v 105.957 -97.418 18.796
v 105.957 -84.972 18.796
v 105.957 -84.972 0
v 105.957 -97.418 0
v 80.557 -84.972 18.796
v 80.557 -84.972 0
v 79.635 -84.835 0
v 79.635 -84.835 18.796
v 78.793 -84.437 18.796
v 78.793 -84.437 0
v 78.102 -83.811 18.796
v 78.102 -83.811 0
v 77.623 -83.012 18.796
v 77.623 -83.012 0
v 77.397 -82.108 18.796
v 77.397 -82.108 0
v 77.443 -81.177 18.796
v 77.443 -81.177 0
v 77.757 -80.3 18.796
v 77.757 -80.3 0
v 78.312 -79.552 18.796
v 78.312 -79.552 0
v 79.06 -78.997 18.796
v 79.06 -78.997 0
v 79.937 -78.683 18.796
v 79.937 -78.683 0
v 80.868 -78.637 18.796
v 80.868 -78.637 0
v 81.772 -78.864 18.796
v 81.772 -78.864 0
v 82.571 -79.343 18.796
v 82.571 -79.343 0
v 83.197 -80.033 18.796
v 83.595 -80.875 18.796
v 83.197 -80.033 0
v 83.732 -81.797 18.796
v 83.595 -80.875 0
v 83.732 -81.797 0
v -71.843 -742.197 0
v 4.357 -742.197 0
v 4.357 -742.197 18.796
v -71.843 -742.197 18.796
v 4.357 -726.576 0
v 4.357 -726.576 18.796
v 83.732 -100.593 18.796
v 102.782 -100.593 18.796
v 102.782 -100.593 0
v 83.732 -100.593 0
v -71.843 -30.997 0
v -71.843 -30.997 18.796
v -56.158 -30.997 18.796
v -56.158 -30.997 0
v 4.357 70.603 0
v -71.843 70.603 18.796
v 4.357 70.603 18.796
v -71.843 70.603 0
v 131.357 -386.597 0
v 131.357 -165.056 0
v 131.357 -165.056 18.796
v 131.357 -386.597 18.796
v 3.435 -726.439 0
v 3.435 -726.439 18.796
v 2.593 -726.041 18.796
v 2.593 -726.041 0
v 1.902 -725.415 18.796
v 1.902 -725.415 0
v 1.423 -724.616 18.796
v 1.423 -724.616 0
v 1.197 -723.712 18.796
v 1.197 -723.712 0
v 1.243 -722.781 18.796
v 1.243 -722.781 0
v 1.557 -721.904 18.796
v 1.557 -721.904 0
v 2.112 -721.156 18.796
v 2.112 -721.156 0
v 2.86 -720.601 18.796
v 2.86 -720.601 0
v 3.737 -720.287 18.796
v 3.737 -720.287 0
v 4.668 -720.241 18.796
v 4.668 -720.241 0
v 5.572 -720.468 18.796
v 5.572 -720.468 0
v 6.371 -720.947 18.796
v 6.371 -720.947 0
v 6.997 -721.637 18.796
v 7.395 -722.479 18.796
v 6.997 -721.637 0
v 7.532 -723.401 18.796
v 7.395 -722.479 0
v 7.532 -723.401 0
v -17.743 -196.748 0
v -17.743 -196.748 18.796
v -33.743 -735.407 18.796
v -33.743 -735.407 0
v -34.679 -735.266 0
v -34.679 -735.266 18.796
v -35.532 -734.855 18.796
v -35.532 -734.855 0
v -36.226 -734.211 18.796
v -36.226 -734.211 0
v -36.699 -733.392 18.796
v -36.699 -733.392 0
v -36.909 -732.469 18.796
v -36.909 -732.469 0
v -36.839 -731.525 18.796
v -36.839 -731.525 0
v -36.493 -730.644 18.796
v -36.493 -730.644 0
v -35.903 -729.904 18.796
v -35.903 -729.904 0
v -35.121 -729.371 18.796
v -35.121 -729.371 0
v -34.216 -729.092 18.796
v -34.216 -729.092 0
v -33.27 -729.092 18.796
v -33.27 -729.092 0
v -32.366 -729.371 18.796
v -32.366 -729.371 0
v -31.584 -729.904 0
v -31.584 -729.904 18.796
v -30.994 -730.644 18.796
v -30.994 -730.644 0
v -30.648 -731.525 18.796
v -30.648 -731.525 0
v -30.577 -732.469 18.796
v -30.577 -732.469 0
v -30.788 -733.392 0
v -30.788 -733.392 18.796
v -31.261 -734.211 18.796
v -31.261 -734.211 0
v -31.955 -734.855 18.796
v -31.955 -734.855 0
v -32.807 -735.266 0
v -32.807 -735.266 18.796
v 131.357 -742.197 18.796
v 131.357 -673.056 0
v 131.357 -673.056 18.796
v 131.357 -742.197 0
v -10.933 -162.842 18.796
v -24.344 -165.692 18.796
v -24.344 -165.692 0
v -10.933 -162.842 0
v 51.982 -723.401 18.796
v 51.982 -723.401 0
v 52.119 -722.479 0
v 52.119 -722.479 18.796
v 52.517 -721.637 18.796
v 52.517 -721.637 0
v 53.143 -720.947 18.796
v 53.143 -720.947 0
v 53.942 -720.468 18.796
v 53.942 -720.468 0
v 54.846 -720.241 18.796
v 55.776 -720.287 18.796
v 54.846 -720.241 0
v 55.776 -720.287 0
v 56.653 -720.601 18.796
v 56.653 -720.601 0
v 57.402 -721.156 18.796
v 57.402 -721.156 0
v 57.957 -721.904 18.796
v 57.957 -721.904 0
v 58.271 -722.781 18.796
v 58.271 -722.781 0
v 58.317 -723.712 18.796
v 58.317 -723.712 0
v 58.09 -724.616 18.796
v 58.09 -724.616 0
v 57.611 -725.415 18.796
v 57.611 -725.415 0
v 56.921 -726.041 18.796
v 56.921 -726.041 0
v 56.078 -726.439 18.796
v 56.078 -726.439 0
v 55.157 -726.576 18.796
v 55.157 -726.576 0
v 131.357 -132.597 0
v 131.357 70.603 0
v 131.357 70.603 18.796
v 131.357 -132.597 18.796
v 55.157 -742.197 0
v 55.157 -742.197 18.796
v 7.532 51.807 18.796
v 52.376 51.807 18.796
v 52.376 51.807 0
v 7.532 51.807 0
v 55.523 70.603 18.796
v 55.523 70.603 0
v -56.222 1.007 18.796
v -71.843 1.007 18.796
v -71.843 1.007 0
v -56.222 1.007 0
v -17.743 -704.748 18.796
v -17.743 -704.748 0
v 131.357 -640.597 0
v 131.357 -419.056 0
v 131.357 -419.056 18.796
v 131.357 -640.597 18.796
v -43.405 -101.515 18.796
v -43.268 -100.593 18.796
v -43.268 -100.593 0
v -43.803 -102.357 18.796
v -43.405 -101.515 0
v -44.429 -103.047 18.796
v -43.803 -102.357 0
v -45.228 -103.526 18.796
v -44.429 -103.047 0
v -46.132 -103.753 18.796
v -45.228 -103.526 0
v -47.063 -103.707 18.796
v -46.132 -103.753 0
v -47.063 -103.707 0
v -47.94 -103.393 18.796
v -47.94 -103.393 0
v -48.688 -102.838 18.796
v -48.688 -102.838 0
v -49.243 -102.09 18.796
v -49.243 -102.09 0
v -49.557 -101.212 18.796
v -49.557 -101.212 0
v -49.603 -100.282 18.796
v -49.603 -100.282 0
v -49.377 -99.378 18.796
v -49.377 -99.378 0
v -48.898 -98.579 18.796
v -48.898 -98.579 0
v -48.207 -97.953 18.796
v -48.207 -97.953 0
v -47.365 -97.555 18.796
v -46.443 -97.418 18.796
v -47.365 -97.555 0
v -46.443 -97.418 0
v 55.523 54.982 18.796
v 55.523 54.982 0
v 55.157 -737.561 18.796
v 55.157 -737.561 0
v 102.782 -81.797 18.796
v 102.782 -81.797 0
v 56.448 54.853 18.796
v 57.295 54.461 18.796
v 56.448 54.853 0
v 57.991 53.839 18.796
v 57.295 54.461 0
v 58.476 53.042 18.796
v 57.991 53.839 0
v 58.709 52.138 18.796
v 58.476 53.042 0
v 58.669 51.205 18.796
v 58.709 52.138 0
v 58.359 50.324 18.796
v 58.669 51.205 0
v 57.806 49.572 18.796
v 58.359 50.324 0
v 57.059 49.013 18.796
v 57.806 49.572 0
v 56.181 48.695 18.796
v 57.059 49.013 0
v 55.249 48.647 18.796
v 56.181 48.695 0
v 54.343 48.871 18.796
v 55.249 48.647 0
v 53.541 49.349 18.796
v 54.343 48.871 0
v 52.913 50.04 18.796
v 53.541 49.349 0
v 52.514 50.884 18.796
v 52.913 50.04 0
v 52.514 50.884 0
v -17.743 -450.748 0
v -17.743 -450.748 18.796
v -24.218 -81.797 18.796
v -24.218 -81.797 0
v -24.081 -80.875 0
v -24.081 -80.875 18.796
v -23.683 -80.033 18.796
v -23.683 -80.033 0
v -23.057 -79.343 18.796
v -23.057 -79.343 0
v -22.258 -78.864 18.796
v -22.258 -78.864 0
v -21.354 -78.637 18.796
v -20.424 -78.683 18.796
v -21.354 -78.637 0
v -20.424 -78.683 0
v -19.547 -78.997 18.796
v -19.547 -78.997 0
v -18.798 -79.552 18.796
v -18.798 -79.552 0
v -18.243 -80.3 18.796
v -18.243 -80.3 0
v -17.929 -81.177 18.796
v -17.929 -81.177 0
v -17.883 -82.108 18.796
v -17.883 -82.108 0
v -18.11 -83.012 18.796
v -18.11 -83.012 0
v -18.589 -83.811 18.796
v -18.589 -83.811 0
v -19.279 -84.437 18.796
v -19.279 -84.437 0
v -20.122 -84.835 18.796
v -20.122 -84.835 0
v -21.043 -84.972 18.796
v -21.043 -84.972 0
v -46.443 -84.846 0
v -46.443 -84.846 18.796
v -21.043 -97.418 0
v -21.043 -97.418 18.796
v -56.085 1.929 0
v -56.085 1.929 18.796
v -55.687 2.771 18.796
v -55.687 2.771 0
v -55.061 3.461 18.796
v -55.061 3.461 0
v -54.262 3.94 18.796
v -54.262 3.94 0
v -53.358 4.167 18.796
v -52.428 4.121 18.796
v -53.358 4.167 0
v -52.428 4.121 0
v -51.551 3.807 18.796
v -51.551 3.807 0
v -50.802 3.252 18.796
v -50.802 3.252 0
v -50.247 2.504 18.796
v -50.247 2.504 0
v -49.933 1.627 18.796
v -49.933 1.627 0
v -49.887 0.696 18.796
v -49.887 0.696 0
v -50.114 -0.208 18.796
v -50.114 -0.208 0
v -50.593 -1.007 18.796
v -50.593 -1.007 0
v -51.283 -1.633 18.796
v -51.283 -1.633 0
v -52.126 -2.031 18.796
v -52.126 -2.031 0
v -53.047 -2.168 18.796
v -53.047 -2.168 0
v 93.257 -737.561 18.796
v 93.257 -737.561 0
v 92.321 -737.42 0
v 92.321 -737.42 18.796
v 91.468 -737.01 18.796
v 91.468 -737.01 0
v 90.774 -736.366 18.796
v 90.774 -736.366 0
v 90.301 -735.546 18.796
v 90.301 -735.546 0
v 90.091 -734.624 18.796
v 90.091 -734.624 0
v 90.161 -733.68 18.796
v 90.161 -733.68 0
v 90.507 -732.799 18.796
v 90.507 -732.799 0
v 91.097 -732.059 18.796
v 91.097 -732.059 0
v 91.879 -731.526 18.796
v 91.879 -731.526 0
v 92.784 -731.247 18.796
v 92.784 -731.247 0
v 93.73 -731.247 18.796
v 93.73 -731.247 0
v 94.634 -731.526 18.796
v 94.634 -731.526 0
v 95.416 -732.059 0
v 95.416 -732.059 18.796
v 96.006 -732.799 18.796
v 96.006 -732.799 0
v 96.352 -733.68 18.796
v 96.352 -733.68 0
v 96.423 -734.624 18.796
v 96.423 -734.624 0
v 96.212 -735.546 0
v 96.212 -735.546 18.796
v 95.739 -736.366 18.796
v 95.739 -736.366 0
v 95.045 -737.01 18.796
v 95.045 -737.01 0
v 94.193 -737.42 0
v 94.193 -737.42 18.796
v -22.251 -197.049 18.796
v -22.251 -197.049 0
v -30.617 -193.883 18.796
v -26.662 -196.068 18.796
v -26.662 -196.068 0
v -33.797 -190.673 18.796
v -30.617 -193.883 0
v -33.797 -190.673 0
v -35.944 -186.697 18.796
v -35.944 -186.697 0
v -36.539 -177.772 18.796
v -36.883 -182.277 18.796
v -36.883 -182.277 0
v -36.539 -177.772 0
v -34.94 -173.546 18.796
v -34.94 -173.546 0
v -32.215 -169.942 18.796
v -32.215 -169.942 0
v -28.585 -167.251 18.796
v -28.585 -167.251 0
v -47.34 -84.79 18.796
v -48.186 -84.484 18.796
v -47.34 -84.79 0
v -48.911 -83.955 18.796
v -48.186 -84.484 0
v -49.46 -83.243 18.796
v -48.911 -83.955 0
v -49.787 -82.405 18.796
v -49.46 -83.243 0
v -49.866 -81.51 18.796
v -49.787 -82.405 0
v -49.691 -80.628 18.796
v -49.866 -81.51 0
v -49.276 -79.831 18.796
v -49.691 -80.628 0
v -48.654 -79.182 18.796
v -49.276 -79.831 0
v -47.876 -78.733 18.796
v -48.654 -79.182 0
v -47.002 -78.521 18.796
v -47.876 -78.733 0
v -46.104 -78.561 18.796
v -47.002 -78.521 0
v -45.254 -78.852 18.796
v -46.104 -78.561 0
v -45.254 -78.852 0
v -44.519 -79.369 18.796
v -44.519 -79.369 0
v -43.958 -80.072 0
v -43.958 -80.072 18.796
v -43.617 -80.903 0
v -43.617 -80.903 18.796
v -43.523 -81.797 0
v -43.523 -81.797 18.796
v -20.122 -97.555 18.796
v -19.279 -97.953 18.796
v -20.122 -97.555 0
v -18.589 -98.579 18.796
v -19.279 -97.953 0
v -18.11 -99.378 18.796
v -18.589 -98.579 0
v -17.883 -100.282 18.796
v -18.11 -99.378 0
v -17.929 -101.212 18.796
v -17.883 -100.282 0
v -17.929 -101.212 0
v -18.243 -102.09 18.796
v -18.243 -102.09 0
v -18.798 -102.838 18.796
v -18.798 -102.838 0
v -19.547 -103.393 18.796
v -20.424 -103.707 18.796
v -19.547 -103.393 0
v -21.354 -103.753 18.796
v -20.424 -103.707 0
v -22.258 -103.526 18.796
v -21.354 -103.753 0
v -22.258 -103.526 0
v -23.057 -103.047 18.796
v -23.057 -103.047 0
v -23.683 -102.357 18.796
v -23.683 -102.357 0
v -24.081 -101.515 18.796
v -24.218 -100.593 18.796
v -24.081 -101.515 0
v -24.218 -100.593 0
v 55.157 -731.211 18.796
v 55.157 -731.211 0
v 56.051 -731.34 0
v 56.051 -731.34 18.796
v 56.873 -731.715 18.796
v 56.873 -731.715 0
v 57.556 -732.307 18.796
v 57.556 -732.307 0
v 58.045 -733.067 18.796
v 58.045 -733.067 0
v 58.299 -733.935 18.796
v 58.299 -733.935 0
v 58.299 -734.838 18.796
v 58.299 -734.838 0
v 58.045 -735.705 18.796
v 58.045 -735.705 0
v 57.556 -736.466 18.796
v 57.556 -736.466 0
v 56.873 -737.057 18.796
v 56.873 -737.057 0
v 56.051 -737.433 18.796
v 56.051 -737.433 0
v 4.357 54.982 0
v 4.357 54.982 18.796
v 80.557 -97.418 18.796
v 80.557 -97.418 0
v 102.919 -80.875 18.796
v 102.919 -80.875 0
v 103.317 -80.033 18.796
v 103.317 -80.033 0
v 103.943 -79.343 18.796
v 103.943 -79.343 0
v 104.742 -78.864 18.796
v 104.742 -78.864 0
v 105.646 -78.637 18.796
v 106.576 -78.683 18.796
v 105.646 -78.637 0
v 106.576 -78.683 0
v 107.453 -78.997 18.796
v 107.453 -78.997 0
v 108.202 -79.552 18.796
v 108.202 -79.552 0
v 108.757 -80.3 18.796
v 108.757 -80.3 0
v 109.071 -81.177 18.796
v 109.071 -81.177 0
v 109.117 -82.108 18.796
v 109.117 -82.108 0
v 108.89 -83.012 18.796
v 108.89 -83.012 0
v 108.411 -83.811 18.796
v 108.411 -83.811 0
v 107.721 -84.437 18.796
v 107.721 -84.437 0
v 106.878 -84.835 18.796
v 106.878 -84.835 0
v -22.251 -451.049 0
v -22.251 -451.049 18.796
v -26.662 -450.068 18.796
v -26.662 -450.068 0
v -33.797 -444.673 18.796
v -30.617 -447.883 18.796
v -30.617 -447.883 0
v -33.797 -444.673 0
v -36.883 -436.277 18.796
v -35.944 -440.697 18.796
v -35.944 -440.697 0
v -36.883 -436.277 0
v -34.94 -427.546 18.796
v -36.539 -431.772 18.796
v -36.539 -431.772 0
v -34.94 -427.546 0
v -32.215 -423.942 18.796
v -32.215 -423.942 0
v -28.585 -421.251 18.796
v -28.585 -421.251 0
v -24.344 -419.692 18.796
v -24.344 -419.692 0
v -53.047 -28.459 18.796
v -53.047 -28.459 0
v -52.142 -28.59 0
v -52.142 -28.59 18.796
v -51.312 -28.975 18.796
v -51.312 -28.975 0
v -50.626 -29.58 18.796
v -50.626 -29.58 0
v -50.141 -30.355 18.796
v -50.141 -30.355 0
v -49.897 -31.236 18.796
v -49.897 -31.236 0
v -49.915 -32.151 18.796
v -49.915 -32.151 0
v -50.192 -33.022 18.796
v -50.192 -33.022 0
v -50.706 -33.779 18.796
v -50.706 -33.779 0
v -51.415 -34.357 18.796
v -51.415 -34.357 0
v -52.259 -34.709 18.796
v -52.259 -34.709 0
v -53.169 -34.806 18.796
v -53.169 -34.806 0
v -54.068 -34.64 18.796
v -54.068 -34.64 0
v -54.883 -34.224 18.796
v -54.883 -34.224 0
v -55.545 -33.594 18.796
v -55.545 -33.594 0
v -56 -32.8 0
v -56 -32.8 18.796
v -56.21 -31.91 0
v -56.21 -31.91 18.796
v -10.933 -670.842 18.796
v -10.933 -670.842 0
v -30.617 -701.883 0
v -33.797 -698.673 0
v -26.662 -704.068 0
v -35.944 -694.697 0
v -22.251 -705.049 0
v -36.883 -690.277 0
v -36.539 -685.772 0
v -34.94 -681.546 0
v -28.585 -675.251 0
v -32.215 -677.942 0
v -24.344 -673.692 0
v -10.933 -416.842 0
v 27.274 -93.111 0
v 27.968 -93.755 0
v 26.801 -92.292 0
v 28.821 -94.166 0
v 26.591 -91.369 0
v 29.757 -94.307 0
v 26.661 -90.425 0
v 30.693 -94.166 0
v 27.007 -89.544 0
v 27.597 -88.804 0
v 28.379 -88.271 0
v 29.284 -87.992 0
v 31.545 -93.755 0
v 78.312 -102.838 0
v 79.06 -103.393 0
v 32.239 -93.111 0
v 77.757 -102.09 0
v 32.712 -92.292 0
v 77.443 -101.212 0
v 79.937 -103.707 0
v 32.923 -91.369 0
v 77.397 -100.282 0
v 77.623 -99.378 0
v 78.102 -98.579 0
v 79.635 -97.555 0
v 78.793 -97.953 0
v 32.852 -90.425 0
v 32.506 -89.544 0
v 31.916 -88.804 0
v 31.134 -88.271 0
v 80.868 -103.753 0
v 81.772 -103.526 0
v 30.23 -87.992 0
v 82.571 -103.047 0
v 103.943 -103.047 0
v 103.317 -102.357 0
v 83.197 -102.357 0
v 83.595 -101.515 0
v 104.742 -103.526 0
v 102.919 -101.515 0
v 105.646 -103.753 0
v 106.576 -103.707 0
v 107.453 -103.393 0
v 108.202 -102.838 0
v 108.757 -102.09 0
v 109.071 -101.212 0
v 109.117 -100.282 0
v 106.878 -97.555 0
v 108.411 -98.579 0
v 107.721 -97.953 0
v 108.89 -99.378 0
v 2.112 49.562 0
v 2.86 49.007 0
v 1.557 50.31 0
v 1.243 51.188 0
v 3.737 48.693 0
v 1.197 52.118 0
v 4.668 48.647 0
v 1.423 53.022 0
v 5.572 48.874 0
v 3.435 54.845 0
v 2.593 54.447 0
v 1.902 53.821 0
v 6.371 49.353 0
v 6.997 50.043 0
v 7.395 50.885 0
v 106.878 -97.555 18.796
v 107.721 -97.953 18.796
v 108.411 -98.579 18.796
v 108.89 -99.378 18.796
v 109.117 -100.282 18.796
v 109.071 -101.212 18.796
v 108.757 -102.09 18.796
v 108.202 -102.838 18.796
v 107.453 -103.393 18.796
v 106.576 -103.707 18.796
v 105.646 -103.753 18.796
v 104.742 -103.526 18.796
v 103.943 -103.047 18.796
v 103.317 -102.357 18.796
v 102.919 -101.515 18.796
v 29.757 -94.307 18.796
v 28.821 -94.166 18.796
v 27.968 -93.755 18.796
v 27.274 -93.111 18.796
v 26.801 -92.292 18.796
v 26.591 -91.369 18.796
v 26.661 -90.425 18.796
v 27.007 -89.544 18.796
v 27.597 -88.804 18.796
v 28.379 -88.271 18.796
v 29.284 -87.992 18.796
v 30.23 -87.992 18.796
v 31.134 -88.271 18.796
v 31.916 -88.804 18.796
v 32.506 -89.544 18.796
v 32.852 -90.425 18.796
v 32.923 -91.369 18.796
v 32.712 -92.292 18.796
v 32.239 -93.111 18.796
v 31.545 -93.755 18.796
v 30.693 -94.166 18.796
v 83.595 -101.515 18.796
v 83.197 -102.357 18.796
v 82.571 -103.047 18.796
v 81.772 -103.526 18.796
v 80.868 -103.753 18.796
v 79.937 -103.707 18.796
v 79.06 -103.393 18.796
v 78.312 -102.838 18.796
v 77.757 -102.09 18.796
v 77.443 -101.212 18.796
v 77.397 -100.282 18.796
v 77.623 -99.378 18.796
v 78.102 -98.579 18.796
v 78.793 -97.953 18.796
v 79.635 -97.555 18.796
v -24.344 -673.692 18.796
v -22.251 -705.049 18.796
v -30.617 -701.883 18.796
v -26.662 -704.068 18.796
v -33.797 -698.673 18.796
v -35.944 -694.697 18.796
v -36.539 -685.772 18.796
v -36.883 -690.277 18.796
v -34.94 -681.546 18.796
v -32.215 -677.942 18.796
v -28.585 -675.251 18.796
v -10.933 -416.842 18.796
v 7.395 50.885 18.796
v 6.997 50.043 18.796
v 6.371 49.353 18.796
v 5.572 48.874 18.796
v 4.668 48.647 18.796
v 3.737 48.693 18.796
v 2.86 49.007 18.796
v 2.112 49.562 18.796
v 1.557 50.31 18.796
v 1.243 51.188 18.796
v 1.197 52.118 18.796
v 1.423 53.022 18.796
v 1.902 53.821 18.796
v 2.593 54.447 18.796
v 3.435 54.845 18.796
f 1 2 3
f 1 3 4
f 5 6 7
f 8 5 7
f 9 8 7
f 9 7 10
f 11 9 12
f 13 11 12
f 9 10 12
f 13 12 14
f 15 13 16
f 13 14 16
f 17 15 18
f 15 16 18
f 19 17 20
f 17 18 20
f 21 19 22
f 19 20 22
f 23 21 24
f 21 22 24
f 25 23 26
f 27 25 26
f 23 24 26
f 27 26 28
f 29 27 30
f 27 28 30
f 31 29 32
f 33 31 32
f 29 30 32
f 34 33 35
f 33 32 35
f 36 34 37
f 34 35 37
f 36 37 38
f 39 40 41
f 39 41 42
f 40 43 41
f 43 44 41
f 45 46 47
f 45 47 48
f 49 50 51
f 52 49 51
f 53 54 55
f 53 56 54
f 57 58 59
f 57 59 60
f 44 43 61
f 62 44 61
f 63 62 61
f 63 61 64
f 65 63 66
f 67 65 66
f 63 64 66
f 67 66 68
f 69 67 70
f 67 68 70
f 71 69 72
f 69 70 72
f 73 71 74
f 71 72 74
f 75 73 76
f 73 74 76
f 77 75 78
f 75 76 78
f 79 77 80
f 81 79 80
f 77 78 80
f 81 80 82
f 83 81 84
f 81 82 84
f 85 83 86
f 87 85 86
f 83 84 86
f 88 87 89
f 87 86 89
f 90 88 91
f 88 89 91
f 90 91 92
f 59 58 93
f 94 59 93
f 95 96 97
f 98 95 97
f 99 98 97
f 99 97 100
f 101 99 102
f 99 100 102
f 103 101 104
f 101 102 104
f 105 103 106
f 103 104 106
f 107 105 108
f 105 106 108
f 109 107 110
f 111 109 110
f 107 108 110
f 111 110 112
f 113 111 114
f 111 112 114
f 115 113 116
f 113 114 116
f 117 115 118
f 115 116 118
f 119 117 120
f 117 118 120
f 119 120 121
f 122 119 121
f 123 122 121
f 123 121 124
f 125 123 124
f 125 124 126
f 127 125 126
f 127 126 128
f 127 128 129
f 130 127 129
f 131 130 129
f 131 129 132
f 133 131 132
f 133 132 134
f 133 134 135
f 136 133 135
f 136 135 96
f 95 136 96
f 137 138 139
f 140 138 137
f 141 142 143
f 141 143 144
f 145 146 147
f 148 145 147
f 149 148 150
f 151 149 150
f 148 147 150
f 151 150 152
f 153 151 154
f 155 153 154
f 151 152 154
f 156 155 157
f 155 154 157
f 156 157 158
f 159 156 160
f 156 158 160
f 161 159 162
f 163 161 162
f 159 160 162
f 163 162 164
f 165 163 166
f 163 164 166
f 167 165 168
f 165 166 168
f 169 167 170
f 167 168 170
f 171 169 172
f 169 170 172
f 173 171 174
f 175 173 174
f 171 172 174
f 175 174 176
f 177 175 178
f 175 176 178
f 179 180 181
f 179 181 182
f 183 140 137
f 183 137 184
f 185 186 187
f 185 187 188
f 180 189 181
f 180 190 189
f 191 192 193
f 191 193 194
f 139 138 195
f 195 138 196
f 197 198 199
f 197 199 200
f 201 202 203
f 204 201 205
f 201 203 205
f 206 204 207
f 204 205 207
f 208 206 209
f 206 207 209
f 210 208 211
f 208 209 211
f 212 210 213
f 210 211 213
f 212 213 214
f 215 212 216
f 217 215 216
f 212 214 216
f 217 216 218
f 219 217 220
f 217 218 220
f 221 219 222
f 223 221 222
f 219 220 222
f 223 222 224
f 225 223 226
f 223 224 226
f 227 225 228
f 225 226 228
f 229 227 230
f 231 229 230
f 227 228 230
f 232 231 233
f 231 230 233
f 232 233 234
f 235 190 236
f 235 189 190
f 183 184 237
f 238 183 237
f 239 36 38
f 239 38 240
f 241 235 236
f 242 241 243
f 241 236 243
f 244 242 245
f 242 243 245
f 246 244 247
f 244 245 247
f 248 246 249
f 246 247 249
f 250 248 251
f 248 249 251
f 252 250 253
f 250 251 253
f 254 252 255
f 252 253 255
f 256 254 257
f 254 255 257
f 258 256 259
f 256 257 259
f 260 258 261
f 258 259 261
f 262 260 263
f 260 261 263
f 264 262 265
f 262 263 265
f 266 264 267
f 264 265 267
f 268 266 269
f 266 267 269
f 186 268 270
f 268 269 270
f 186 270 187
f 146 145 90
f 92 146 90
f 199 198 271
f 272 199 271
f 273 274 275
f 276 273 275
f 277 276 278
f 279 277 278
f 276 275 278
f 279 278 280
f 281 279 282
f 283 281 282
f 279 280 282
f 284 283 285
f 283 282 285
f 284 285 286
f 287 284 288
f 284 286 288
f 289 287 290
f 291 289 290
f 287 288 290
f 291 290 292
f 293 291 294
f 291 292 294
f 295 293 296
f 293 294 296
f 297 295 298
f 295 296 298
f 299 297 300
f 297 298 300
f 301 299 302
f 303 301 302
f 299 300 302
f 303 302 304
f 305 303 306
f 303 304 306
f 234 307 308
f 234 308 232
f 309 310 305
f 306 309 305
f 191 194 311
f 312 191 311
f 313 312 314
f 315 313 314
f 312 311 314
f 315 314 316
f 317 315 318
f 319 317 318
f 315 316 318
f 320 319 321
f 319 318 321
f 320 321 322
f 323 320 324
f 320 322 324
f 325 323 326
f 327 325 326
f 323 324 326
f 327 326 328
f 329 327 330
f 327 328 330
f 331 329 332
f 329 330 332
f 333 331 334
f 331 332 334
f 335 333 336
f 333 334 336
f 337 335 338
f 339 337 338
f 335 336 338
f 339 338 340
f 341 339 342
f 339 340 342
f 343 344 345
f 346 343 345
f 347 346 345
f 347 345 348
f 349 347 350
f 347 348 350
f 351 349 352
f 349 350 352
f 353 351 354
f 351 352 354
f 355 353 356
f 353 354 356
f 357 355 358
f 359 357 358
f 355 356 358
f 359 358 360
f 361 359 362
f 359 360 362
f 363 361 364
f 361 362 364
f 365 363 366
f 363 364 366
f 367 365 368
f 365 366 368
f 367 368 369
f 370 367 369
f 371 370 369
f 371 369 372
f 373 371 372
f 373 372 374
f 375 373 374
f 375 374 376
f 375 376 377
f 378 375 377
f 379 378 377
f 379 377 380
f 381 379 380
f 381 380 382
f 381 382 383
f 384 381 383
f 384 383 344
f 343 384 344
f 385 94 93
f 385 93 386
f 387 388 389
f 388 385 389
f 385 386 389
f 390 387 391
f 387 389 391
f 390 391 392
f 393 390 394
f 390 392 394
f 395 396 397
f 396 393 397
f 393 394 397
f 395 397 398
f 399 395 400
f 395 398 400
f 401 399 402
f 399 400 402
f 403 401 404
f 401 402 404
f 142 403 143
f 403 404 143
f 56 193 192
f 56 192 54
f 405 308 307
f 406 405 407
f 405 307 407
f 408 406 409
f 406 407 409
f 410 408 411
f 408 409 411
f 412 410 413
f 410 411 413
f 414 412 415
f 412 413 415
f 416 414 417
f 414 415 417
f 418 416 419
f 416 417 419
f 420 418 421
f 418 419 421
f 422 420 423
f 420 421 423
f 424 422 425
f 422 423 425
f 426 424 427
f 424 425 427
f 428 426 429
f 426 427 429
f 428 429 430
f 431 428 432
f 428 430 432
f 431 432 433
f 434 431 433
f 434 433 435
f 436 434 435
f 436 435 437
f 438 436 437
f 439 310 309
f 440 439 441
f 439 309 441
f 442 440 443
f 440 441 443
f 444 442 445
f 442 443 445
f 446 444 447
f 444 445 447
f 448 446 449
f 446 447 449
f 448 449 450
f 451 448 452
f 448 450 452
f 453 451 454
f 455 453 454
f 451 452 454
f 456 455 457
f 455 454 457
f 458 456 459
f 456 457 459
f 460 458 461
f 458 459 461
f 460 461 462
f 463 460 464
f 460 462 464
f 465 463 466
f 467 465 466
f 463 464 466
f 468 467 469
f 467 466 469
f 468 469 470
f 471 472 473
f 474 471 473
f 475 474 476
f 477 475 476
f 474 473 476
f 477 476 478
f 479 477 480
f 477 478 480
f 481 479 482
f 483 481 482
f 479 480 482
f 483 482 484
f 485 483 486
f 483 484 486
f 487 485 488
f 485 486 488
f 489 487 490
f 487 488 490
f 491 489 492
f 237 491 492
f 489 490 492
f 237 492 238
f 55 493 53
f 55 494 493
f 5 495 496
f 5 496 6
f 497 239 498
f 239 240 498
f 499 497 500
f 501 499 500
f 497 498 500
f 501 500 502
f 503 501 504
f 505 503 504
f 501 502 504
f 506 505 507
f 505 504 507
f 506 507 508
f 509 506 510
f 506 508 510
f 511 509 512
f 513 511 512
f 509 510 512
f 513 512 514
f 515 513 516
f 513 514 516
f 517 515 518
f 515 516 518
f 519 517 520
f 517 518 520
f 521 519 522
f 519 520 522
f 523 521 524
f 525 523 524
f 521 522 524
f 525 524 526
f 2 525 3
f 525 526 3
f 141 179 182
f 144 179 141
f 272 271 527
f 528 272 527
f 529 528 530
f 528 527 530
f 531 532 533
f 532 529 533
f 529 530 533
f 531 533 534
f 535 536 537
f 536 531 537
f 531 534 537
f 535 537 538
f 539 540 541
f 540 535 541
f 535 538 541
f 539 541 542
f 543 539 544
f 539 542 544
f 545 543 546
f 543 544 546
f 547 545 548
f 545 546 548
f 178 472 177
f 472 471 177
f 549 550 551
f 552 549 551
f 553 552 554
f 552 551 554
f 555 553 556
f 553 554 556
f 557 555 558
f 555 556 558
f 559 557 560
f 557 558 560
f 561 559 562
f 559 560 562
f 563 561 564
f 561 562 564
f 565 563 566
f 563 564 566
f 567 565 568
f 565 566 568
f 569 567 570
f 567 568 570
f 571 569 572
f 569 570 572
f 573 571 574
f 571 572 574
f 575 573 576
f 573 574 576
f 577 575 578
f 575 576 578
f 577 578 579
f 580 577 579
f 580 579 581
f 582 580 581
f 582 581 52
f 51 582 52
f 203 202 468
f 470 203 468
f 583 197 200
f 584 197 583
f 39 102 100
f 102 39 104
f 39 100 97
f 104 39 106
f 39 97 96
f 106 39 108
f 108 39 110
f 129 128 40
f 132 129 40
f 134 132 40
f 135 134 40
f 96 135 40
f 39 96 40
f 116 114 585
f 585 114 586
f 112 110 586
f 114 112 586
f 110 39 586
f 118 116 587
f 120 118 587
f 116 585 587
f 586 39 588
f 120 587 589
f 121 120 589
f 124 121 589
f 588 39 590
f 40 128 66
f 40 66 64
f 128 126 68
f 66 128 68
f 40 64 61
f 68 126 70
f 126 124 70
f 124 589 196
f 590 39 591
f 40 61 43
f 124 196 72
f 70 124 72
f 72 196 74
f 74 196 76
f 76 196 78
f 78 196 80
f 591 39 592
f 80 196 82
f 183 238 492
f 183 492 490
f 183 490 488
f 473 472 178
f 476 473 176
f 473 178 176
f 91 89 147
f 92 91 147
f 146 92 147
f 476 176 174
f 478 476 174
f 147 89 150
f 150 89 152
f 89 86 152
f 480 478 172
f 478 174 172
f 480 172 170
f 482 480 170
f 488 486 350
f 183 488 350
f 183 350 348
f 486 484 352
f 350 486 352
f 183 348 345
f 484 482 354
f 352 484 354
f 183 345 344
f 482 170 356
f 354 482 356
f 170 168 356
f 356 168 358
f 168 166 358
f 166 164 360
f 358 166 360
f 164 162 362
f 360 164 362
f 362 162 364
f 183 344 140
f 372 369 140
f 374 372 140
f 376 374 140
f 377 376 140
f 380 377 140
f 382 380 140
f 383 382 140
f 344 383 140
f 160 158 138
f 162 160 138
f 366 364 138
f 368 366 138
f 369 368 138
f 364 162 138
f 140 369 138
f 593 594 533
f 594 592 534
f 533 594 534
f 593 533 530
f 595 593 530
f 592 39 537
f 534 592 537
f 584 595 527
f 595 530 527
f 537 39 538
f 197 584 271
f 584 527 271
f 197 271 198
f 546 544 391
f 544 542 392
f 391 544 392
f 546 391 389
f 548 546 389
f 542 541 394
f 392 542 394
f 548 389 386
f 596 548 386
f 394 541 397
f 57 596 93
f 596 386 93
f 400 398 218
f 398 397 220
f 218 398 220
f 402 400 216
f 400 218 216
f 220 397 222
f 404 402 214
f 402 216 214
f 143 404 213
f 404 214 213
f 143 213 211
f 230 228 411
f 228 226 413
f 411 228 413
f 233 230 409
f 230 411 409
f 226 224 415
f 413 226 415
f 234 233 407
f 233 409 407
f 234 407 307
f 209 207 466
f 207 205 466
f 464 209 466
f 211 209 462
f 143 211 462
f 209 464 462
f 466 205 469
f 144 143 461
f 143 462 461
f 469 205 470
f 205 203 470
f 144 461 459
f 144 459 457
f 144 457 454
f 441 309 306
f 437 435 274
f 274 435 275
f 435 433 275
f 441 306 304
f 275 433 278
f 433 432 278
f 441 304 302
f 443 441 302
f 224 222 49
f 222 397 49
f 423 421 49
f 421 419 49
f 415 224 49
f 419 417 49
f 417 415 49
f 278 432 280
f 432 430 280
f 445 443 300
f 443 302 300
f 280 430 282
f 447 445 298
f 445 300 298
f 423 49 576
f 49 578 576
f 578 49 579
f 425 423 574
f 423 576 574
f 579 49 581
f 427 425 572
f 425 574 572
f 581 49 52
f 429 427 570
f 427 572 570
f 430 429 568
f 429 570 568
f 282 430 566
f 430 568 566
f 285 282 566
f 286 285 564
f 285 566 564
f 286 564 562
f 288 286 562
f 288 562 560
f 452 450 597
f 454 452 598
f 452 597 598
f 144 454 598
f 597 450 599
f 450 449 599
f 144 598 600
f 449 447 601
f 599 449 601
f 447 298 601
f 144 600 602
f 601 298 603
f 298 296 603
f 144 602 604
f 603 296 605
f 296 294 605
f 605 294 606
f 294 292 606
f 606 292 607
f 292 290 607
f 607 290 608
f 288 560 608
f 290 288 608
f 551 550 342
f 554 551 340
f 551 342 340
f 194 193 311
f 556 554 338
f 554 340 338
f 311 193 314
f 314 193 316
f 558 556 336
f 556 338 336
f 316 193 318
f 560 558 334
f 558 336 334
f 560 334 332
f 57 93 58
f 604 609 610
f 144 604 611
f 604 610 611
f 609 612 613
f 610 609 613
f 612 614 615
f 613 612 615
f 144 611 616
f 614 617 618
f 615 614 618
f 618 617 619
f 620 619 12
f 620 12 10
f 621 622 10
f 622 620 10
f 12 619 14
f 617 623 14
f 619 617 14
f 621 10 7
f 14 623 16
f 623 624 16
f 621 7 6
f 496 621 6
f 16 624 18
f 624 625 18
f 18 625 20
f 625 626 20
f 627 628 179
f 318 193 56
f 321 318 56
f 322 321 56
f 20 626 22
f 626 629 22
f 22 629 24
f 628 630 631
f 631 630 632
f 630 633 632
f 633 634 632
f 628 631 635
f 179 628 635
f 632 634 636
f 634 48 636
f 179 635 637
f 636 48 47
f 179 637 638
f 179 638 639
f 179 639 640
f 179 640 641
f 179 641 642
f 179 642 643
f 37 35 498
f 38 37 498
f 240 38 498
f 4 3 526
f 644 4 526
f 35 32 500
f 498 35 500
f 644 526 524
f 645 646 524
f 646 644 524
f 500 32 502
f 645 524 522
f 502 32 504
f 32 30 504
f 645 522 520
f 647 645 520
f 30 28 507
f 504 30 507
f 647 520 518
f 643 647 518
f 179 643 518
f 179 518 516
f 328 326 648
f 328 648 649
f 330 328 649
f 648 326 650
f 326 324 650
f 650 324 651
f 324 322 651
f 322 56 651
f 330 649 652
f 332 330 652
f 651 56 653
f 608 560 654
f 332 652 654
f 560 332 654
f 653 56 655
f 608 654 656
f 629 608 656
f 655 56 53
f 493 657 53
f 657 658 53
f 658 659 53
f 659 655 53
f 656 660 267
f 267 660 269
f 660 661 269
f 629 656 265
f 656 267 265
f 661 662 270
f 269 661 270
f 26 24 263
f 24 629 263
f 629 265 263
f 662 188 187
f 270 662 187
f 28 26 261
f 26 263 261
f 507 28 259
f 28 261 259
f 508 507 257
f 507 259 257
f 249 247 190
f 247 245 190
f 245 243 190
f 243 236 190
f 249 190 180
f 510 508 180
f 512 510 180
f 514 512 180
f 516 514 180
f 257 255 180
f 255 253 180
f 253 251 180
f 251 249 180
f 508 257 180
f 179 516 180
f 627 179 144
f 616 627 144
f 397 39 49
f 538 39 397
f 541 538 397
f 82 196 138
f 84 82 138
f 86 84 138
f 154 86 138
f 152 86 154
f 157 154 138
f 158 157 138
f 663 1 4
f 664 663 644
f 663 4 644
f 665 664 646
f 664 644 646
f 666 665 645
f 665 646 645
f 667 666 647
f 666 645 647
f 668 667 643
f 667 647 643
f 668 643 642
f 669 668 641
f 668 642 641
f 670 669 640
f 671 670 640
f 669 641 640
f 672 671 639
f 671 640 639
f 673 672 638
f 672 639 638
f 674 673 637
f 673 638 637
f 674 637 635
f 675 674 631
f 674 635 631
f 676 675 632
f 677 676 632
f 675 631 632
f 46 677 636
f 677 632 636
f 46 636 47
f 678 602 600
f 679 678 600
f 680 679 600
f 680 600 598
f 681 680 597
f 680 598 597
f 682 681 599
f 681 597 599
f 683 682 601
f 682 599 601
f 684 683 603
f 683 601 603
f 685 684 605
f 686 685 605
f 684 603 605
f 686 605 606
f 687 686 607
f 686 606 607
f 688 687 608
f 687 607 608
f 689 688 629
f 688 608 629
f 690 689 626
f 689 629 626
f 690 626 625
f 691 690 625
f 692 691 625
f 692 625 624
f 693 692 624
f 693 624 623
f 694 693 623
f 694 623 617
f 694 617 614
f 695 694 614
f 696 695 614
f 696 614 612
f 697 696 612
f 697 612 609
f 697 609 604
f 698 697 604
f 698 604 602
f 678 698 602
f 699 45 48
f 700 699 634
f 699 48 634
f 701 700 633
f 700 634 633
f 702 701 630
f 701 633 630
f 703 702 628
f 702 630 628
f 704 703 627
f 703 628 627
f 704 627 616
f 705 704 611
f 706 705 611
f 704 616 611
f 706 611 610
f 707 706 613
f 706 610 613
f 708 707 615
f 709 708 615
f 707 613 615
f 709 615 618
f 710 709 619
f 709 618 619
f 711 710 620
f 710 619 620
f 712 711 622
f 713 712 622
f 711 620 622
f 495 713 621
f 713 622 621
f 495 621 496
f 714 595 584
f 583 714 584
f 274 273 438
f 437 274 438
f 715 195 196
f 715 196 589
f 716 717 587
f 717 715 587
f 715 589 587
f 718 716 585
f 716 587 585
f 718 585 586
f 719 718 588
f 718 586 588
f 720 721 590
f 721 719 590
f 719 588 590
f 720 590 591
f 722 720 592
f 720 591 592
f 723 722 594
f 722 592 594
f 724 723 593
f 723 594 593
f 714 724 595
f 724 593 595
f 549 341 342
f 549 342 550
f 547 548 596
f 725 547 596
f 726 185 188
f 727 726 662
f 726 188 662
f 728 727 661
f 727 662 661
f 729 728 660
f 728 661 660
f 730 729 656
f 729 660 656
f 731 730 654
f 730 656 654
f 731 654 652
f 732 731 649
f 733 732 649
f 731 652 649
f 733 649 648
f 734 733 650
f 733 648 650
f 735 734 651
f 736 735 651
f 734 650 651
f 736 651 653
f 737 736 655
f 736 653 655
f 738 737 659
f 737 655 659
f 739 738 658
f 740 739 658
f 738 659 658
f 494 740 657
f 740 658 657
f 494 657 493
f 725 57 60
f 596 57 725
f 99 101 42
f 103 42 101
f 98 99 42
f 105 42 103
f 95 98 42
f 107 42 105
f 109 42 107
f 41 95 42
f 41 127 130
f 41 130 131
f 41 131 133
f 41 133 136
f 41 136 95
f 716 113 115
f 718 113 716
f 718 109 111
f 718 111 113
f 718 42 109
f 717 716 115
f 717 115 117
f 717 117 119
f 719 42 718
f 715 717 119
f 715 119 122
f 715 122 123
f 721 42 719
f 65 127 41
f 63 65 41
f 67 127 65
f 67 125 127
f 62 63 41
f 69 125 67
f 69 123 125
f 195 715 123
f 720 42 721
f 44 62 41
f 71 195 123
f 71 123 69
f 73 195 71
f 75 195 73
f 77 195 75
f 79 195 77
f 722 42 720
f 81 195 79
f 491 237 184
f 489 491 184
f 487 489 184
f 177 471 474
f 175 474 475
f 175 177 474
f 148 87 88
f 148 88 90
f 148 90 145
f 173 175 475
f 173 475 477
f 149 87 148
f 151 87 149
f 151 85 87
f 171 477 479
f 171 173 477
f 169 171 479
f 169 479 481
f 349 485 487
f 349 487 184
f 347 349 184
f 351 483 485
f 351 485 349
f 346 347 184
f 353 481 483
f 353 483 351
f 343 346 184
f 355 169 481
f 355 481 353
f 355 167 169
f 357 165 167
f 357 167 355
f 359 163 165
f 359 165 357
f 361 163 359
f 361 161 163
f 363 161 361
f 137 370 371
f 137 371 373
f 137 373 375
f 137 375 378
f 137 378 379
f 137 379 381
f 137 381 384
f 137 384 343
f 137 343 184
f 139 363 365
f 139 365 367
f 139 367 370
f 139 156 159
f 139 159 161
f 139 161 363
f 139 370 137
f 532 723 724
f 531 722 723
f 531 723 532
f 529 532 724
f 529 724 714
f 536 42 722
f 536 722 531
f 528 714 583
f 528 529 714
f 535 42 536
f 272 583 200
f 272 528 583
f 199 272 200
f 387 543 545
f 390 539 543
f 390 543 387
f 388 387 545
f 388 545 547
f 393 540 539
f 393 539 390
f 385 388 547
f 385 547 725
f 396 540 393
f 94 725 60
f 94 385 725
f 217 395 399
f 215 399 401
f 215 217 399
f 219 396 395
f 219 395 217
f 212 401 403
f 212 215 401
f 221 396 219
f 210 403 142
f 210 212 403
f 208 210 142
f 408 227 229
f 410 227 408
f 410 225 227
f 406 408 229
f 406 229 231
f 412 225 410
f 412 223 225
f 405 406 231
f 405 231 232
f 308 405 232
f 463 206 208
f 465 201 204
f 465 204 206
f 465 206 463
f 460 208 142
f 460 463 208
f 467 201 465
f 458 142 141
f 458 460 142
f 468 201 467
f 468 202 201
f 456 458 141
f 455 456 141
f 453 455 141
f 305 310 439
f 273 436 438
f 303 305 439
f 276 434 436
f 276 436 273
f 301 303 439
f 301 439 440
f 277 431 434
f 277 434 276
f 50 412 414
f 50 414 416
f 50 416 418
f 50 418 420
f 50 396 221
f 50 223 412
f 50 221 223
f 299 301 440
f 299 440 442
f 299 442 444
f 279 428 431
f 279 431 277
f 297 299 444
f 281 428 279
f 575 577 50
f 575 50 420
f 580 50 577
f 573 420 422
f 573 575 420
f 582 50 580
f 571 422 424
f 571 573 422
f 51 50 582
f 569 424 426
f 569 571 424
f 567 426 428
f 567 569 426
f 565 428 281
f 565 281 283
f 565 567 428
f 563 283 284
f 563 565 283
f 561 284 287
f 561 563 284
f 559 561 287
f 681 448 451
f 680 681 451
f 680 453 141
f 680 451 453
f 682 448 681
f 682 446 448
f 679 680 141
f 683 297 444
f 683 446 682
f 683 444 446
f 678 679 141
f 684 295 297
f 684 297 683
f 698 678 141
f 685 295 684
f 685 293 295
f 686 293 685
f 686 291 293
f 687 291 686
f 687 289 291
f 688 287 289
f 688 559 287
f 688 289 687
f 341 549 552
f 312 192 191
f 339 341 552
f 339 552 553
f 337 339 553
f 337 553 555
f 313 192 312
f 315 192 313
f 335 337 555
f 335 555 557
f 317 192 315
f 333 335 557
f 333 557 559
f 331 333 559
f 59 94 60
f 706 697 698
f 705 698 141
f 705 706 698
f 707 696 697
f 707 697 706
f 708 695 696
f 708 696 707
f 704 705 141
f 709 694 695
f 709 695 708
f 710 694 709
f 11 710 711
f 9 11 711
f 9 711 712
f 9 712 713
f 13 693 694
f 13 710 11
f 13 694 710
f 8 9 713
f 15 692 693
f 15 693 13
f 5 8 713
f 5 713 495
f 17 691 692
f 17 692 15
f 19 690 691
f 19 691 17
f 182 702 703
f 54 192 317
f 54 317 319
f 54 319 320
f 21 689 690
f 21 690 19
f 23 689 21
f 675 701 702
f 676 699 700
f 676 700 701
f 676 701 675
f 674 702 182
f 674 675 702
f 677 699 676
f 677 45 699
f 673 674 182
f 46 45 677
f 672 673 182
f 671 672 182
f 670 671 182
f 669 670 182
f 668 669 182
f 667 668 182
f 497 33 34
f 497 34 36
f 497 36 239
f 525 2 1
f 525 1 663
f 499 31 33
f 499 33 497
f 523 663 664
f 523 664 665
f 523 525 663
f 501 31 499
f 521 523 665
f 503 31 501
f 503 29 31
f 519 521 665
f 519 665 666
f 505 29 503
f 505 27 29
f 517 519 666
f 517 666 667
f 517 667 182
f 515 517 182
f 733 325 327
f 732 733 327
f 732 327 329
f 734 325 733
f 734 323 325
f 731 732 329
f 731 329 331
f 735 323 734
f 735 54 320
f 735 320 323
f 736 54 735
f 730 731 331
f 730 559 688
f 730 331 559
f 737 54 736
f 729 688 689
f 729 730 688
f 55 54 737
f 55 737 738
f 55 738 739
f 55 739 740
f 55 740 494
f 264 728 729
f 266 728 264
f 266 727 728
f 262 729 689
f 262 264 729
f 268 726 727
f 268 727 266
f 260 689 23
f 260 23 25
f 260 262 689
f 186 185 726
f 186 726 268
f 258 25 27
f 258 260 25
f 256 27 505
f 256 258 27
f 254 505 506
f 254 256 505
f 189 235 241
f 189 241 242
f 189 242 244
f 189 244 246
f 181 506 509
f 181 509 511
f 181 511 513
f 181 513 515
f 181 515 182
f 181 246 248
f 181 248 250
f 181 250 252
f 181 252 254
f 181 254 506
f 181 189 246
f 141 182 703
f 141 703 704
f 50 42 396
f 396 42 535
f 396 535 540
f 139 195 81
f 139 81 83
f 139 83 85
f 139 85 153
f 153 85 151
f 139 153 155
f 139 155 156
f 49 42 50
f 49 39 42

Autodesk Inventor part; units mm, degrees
ref_plane "YZ Plane" through (0, 0, 0) normal (1, 0, 0) x (0, 1, 0)
ref_plane "XZ Plane" through (0, 0, 0) normal (0, 1, 0) x (-1, 0, 0)
ref_plane "XY Plane" through (0, 0, 0) normal (0, 0, 1) x (1, 0, 0)
sketch "Sketch1" plane through (0, 0, 0) normal (0, 0, 1) x (1, 0, 0)
  line L0 (-71.8432, 70.6031) -> (131.3568, 70.6031)
  line L1 (131.3568, -742.1969) -> (-71.8432, -742.1969)
  line L2 (-71.8432, -742.1969) -> (-71.8432, 70.6031)
  line L3 (131.3568, -132.5969) -> (-10.9328, -162.8415)
  line L4 (131.3568, -165.0562) -> (-19.8283, -197.1916)
  arc A0 (-24.3438, -165.6921) -> (-17.7426, -196.7483) centre (-21.0432, -181.2202) ccw
  line L5 (131.3568, 70.6031) -> (131.3568, -132.5969)
  line L6 (131.3568, -165.0562) -> (131.3568, -742.1969) construction
  line L7 (131.3568, -386.5969) -> (-10.9328, -416.8415)
  line L8 (131.3568, -419.0562) -> (-19.8283, -451.1916)
  arc A1 (-24.3438, -419.6921) -> (-17.7426, -450.7483) centre (-21.0432, -435.2202) ccw
  line L9 (131.3568, -640.5969) -> (-10.9328, -670.8415)
  line L10 (131.3568, -673.0562) -> (-19.8283, -705.1916)
  arc A2 (-24.3438, -673.6921) -> (-17.7426, -704.7483) centre (-21.0432, -689.2202) ccw
  line L11 (131.3568, -165.0562) -> (131.3568, -386.5969)
  line L12 (131.3568, -419.0562) -> (131.3568, -640.5969)
  line L13 (131.3568, -673.0562) -> (131.3568, -742.1969)
  line L14 (-24.3438, -165.6921) -> (-10.9328, -162.8415)
  line L15 (-24.3438, -419.6921) -> (-10.9328, -416.8415)
  line L16 (-24.3438, -673.6921) -> (-9.6152, -670.5614)
  point P0 (0, 0)
  dimension "d0" = 203.2
  dimension "d1" = 812.8
  dimension "d3" = 31.75
  dimension "d4" = 203.2
  dimension "d7" = 254
  dimension "d48" = 152.4
extrude "Extrusion1" add sketch "Sketch1" along normal blind 18.796
sketch "Sketch3" plane through (0, 0, 18.796) normal (0, 0, 1) x (1, 0, 0)
  line L0 (-71.8432, 70.6031) -> (131.3568, 70.6031) projected
  line L1 (4.3568, 70.6031) -> (55.5231, 70.6031)
  line L2 (55.5231, 70.6031) -> (55.5231, 51.8071)
  line L3 (55.5231, 51.8071) -> (4.3568, 51.8071)
  line L4 (4.3568, 51.8071) -> (4.3568, 70.6031)
  line L5 (-71.8432, 70.6031) -> (-71.8432, -742.1969) projected
  point P0 (0, 0)
  dimension "d31" = 18.796
  dimension "d32" = 0
  dimension "d34" = 76.2
extrude "Extrusion2" cut sketch "Sketch3" against normal blind 18.796
sketch "Sketch5" plane through (0, 0, 18.796) normal (0, 0, 1) x (1, 0, 0)
  line L0 (80.5568, -81.7969) -> (105.9568, -81.7969)
  line L1 (105.9568, -81.7969) -> (105.9568, -100.5929)
  line L2 (105.9568, -100.5929) -> (80.5568, -100.5929)
  line L3 (80.5568, -100.5929) -> (80.5568, -81.7969)
  line L4 (-71.8432, 70.6031) -> (-71.8432, -742.1969) projected
  line L5 (131.3568, -132.5969) -> (131.3568, 70.6031) projected
  line L6 (131.3568, 70.6031) -> (55.5231, 70.6031) projected
  line L7 (-21.0432, -81.7969) -> (-46.4432, -81.7969)
  line L8 (-46.4432, -81.7969) -> (-46.4432, -100.5929)
  line L9 (-46.4432, -100.5929) -> (-21.0432, -100.5929)
  line L10 (-21.0432, -100.5929) -> (-21.0432, -81.7969)
  line L11 (4.3568, -742.1969) -> (55.1568, -742.1969)
  line L12 (55.1568, -742.1969) -> (55.1568, -723.4009)
  line L13 (55.1568, -723.4009) -> (4.3568, -723.4009)
  line L14 (4.3568, -723.4009) -> (4.3568, -742.1969)
  line L15 (-71.8432, -742.1969) -> (131.3568, -742.1969) projected
  point P0 (0, 0)
  dimension "d51" = 25.4
  dimension "d52" = 18.796
  dimension "d53" = 25.4
  dimension "d54" = 152.4
  dimension "d55" = 25.4
  dimension "d56" = 18.796
  dimension "d57" = 25.4
  dimension "d58" = 50.8
  dimension "d59" = 18.796
  dimension "d60" = 0
  dimension "d61" = 76.2
extrude "Extrusion4" cut sketch "Sketch5" against normal blind 25.4
sketch "Sketch6" plane through (0, 0, 18.796) normal (0, 0, 1) x (1, 0, 0)
  line L0 (-71.8432, 70.6031) -> (4.3568, 70.6031) projected
  line L1 (-71.8432, 1.0071) -> (-53.0472, 1.0071)
  line L2 (-71.8432, -30.9969) -> (-53.0472, -30.9969)
  line L3 (-71.8432, 1.0071) -> (-71.8432, -30.9969)
  line L4 (-71.8432, -742.1969) -> (-71.8432, 70.6031) projected
  line L5 (-53.0472, 1.0071) -> (-53.0472, -30.9969)
  point P0 (0, 0)
  dimension "d66" = 32.004
  dimension "d68" = 18.796
extrude "Extrusion5" cut sketch "Sketch6" against normal blind 25.4
sketch "Sketch8" plane through (0, 0, 18.796) normal (0, 0, 1) x (1, 0, 0)
  line L0 (4.3568, -742.1969) -> (4.3568, -723.4009) projected
  line L1 (4.3568, -723.4009) -> (55.1568, -723.4009) projected
  point P0 (0, 0)
  point P1 (4.3568, 51.8071)
  point P2 (55.5513, 51.8071)
hole "Hole2" at (4.3568, 51.8071, 18.796) at (55.5513, 51.8071, 18.796) at (4.3568, -723.4009, 18.796) at (55.1568, -723.4009, 18.796) direction (0, 0, -1) diameter 6.35 end through all
sketch "Sketch9" plane through (0, 0, 18.796) normal (0, 0, 1) x (1, 0, 0)
  line L0 (-21.0432, -81.7969) -> (-46.4432, -81.7969) projected
  line L1 (-21.0432, -100.5929) -> (-21.0432, -81.7969) projected
  line L2 (-46.4432, -100.5929) -> (-21.0432, -100.5929) projected
  line L3 (105.9568, -81.7969) -> (80.5568, -81.7969) projected
  line L4 (80.5568, -100.5929) -> (105.9568, -100.5929) projected
  line L5 (105.9568, -100.5929) -> (105.9568, -81.7969) projected
  point P0 (0, 0)
  point P1 (-46.6954, -81.6809)
hole "Hole3" at (-46.6954, -81.6809, 18.796) at (-21.0432, -81.7969, 18.796) at (-21.0432, -100.5929, 18.796) at (-46.4432, -100.5929, 18.796) at (80.5568, -81.7969, 18.796) at (80.5568, -100.5929, 18.796) at (105.9568, -100.5929, 18.796) at (105.9568, -81.7969, 18.796) direction (0, 0, -1) diameter 6.35 end through all
sketch "Sketch10" plane through (0, 0, 18.796) normal (0, 0, 1) x (1, 0, 0)
  line L0 (-53.0472, 1.0071) -> (-71.8432, 1.0071) projected
  point P0 (0, 0)
  point P1 (-53.0472, -31.6336)
hole "Hole4" at (-53.0472, 1.0071, 18.796) at (-53.0472, -31.6336, 18.796) direction (0, 0, -1) diameter 6.35 end through all
sketch "Sketch11" plane through (0, 0, 18.796) normal (0, 0, 1) x (1, 0, 0)
  line L0 (-71.8432, -30.9969) -> (-71.8432, -742.1969) projected
  line L1 (55.1568, -726.5759) -> (55.1568, -742.1969) projected
  line L2 (131.3568, -742.1969) -> (131.3568, -673.0562) projected
  point P0 (0, 0)
  point P1 (29.7568, -91.1319)
  point P2 (-33.7432, -732.2316)
  point P3 (55.1568, -734.3864)
  point P4 (93.2568, -734.3864)
  dimension "d92" = 101.6
  dimension "d93" = 38.1
  dimension "d94" = 38.1
hole "Hole5" at (29.7568, -91.1319, 18.796) at (-33.7432, -732.2316, 18.796) at (55.1568, -734.3864, 18.796) at (93.2568, -734.3864, 18.796) direction (0, 0, -1) diameter 6.35 end through all
properties part number "rack sides" material "Wood (Birch)"
